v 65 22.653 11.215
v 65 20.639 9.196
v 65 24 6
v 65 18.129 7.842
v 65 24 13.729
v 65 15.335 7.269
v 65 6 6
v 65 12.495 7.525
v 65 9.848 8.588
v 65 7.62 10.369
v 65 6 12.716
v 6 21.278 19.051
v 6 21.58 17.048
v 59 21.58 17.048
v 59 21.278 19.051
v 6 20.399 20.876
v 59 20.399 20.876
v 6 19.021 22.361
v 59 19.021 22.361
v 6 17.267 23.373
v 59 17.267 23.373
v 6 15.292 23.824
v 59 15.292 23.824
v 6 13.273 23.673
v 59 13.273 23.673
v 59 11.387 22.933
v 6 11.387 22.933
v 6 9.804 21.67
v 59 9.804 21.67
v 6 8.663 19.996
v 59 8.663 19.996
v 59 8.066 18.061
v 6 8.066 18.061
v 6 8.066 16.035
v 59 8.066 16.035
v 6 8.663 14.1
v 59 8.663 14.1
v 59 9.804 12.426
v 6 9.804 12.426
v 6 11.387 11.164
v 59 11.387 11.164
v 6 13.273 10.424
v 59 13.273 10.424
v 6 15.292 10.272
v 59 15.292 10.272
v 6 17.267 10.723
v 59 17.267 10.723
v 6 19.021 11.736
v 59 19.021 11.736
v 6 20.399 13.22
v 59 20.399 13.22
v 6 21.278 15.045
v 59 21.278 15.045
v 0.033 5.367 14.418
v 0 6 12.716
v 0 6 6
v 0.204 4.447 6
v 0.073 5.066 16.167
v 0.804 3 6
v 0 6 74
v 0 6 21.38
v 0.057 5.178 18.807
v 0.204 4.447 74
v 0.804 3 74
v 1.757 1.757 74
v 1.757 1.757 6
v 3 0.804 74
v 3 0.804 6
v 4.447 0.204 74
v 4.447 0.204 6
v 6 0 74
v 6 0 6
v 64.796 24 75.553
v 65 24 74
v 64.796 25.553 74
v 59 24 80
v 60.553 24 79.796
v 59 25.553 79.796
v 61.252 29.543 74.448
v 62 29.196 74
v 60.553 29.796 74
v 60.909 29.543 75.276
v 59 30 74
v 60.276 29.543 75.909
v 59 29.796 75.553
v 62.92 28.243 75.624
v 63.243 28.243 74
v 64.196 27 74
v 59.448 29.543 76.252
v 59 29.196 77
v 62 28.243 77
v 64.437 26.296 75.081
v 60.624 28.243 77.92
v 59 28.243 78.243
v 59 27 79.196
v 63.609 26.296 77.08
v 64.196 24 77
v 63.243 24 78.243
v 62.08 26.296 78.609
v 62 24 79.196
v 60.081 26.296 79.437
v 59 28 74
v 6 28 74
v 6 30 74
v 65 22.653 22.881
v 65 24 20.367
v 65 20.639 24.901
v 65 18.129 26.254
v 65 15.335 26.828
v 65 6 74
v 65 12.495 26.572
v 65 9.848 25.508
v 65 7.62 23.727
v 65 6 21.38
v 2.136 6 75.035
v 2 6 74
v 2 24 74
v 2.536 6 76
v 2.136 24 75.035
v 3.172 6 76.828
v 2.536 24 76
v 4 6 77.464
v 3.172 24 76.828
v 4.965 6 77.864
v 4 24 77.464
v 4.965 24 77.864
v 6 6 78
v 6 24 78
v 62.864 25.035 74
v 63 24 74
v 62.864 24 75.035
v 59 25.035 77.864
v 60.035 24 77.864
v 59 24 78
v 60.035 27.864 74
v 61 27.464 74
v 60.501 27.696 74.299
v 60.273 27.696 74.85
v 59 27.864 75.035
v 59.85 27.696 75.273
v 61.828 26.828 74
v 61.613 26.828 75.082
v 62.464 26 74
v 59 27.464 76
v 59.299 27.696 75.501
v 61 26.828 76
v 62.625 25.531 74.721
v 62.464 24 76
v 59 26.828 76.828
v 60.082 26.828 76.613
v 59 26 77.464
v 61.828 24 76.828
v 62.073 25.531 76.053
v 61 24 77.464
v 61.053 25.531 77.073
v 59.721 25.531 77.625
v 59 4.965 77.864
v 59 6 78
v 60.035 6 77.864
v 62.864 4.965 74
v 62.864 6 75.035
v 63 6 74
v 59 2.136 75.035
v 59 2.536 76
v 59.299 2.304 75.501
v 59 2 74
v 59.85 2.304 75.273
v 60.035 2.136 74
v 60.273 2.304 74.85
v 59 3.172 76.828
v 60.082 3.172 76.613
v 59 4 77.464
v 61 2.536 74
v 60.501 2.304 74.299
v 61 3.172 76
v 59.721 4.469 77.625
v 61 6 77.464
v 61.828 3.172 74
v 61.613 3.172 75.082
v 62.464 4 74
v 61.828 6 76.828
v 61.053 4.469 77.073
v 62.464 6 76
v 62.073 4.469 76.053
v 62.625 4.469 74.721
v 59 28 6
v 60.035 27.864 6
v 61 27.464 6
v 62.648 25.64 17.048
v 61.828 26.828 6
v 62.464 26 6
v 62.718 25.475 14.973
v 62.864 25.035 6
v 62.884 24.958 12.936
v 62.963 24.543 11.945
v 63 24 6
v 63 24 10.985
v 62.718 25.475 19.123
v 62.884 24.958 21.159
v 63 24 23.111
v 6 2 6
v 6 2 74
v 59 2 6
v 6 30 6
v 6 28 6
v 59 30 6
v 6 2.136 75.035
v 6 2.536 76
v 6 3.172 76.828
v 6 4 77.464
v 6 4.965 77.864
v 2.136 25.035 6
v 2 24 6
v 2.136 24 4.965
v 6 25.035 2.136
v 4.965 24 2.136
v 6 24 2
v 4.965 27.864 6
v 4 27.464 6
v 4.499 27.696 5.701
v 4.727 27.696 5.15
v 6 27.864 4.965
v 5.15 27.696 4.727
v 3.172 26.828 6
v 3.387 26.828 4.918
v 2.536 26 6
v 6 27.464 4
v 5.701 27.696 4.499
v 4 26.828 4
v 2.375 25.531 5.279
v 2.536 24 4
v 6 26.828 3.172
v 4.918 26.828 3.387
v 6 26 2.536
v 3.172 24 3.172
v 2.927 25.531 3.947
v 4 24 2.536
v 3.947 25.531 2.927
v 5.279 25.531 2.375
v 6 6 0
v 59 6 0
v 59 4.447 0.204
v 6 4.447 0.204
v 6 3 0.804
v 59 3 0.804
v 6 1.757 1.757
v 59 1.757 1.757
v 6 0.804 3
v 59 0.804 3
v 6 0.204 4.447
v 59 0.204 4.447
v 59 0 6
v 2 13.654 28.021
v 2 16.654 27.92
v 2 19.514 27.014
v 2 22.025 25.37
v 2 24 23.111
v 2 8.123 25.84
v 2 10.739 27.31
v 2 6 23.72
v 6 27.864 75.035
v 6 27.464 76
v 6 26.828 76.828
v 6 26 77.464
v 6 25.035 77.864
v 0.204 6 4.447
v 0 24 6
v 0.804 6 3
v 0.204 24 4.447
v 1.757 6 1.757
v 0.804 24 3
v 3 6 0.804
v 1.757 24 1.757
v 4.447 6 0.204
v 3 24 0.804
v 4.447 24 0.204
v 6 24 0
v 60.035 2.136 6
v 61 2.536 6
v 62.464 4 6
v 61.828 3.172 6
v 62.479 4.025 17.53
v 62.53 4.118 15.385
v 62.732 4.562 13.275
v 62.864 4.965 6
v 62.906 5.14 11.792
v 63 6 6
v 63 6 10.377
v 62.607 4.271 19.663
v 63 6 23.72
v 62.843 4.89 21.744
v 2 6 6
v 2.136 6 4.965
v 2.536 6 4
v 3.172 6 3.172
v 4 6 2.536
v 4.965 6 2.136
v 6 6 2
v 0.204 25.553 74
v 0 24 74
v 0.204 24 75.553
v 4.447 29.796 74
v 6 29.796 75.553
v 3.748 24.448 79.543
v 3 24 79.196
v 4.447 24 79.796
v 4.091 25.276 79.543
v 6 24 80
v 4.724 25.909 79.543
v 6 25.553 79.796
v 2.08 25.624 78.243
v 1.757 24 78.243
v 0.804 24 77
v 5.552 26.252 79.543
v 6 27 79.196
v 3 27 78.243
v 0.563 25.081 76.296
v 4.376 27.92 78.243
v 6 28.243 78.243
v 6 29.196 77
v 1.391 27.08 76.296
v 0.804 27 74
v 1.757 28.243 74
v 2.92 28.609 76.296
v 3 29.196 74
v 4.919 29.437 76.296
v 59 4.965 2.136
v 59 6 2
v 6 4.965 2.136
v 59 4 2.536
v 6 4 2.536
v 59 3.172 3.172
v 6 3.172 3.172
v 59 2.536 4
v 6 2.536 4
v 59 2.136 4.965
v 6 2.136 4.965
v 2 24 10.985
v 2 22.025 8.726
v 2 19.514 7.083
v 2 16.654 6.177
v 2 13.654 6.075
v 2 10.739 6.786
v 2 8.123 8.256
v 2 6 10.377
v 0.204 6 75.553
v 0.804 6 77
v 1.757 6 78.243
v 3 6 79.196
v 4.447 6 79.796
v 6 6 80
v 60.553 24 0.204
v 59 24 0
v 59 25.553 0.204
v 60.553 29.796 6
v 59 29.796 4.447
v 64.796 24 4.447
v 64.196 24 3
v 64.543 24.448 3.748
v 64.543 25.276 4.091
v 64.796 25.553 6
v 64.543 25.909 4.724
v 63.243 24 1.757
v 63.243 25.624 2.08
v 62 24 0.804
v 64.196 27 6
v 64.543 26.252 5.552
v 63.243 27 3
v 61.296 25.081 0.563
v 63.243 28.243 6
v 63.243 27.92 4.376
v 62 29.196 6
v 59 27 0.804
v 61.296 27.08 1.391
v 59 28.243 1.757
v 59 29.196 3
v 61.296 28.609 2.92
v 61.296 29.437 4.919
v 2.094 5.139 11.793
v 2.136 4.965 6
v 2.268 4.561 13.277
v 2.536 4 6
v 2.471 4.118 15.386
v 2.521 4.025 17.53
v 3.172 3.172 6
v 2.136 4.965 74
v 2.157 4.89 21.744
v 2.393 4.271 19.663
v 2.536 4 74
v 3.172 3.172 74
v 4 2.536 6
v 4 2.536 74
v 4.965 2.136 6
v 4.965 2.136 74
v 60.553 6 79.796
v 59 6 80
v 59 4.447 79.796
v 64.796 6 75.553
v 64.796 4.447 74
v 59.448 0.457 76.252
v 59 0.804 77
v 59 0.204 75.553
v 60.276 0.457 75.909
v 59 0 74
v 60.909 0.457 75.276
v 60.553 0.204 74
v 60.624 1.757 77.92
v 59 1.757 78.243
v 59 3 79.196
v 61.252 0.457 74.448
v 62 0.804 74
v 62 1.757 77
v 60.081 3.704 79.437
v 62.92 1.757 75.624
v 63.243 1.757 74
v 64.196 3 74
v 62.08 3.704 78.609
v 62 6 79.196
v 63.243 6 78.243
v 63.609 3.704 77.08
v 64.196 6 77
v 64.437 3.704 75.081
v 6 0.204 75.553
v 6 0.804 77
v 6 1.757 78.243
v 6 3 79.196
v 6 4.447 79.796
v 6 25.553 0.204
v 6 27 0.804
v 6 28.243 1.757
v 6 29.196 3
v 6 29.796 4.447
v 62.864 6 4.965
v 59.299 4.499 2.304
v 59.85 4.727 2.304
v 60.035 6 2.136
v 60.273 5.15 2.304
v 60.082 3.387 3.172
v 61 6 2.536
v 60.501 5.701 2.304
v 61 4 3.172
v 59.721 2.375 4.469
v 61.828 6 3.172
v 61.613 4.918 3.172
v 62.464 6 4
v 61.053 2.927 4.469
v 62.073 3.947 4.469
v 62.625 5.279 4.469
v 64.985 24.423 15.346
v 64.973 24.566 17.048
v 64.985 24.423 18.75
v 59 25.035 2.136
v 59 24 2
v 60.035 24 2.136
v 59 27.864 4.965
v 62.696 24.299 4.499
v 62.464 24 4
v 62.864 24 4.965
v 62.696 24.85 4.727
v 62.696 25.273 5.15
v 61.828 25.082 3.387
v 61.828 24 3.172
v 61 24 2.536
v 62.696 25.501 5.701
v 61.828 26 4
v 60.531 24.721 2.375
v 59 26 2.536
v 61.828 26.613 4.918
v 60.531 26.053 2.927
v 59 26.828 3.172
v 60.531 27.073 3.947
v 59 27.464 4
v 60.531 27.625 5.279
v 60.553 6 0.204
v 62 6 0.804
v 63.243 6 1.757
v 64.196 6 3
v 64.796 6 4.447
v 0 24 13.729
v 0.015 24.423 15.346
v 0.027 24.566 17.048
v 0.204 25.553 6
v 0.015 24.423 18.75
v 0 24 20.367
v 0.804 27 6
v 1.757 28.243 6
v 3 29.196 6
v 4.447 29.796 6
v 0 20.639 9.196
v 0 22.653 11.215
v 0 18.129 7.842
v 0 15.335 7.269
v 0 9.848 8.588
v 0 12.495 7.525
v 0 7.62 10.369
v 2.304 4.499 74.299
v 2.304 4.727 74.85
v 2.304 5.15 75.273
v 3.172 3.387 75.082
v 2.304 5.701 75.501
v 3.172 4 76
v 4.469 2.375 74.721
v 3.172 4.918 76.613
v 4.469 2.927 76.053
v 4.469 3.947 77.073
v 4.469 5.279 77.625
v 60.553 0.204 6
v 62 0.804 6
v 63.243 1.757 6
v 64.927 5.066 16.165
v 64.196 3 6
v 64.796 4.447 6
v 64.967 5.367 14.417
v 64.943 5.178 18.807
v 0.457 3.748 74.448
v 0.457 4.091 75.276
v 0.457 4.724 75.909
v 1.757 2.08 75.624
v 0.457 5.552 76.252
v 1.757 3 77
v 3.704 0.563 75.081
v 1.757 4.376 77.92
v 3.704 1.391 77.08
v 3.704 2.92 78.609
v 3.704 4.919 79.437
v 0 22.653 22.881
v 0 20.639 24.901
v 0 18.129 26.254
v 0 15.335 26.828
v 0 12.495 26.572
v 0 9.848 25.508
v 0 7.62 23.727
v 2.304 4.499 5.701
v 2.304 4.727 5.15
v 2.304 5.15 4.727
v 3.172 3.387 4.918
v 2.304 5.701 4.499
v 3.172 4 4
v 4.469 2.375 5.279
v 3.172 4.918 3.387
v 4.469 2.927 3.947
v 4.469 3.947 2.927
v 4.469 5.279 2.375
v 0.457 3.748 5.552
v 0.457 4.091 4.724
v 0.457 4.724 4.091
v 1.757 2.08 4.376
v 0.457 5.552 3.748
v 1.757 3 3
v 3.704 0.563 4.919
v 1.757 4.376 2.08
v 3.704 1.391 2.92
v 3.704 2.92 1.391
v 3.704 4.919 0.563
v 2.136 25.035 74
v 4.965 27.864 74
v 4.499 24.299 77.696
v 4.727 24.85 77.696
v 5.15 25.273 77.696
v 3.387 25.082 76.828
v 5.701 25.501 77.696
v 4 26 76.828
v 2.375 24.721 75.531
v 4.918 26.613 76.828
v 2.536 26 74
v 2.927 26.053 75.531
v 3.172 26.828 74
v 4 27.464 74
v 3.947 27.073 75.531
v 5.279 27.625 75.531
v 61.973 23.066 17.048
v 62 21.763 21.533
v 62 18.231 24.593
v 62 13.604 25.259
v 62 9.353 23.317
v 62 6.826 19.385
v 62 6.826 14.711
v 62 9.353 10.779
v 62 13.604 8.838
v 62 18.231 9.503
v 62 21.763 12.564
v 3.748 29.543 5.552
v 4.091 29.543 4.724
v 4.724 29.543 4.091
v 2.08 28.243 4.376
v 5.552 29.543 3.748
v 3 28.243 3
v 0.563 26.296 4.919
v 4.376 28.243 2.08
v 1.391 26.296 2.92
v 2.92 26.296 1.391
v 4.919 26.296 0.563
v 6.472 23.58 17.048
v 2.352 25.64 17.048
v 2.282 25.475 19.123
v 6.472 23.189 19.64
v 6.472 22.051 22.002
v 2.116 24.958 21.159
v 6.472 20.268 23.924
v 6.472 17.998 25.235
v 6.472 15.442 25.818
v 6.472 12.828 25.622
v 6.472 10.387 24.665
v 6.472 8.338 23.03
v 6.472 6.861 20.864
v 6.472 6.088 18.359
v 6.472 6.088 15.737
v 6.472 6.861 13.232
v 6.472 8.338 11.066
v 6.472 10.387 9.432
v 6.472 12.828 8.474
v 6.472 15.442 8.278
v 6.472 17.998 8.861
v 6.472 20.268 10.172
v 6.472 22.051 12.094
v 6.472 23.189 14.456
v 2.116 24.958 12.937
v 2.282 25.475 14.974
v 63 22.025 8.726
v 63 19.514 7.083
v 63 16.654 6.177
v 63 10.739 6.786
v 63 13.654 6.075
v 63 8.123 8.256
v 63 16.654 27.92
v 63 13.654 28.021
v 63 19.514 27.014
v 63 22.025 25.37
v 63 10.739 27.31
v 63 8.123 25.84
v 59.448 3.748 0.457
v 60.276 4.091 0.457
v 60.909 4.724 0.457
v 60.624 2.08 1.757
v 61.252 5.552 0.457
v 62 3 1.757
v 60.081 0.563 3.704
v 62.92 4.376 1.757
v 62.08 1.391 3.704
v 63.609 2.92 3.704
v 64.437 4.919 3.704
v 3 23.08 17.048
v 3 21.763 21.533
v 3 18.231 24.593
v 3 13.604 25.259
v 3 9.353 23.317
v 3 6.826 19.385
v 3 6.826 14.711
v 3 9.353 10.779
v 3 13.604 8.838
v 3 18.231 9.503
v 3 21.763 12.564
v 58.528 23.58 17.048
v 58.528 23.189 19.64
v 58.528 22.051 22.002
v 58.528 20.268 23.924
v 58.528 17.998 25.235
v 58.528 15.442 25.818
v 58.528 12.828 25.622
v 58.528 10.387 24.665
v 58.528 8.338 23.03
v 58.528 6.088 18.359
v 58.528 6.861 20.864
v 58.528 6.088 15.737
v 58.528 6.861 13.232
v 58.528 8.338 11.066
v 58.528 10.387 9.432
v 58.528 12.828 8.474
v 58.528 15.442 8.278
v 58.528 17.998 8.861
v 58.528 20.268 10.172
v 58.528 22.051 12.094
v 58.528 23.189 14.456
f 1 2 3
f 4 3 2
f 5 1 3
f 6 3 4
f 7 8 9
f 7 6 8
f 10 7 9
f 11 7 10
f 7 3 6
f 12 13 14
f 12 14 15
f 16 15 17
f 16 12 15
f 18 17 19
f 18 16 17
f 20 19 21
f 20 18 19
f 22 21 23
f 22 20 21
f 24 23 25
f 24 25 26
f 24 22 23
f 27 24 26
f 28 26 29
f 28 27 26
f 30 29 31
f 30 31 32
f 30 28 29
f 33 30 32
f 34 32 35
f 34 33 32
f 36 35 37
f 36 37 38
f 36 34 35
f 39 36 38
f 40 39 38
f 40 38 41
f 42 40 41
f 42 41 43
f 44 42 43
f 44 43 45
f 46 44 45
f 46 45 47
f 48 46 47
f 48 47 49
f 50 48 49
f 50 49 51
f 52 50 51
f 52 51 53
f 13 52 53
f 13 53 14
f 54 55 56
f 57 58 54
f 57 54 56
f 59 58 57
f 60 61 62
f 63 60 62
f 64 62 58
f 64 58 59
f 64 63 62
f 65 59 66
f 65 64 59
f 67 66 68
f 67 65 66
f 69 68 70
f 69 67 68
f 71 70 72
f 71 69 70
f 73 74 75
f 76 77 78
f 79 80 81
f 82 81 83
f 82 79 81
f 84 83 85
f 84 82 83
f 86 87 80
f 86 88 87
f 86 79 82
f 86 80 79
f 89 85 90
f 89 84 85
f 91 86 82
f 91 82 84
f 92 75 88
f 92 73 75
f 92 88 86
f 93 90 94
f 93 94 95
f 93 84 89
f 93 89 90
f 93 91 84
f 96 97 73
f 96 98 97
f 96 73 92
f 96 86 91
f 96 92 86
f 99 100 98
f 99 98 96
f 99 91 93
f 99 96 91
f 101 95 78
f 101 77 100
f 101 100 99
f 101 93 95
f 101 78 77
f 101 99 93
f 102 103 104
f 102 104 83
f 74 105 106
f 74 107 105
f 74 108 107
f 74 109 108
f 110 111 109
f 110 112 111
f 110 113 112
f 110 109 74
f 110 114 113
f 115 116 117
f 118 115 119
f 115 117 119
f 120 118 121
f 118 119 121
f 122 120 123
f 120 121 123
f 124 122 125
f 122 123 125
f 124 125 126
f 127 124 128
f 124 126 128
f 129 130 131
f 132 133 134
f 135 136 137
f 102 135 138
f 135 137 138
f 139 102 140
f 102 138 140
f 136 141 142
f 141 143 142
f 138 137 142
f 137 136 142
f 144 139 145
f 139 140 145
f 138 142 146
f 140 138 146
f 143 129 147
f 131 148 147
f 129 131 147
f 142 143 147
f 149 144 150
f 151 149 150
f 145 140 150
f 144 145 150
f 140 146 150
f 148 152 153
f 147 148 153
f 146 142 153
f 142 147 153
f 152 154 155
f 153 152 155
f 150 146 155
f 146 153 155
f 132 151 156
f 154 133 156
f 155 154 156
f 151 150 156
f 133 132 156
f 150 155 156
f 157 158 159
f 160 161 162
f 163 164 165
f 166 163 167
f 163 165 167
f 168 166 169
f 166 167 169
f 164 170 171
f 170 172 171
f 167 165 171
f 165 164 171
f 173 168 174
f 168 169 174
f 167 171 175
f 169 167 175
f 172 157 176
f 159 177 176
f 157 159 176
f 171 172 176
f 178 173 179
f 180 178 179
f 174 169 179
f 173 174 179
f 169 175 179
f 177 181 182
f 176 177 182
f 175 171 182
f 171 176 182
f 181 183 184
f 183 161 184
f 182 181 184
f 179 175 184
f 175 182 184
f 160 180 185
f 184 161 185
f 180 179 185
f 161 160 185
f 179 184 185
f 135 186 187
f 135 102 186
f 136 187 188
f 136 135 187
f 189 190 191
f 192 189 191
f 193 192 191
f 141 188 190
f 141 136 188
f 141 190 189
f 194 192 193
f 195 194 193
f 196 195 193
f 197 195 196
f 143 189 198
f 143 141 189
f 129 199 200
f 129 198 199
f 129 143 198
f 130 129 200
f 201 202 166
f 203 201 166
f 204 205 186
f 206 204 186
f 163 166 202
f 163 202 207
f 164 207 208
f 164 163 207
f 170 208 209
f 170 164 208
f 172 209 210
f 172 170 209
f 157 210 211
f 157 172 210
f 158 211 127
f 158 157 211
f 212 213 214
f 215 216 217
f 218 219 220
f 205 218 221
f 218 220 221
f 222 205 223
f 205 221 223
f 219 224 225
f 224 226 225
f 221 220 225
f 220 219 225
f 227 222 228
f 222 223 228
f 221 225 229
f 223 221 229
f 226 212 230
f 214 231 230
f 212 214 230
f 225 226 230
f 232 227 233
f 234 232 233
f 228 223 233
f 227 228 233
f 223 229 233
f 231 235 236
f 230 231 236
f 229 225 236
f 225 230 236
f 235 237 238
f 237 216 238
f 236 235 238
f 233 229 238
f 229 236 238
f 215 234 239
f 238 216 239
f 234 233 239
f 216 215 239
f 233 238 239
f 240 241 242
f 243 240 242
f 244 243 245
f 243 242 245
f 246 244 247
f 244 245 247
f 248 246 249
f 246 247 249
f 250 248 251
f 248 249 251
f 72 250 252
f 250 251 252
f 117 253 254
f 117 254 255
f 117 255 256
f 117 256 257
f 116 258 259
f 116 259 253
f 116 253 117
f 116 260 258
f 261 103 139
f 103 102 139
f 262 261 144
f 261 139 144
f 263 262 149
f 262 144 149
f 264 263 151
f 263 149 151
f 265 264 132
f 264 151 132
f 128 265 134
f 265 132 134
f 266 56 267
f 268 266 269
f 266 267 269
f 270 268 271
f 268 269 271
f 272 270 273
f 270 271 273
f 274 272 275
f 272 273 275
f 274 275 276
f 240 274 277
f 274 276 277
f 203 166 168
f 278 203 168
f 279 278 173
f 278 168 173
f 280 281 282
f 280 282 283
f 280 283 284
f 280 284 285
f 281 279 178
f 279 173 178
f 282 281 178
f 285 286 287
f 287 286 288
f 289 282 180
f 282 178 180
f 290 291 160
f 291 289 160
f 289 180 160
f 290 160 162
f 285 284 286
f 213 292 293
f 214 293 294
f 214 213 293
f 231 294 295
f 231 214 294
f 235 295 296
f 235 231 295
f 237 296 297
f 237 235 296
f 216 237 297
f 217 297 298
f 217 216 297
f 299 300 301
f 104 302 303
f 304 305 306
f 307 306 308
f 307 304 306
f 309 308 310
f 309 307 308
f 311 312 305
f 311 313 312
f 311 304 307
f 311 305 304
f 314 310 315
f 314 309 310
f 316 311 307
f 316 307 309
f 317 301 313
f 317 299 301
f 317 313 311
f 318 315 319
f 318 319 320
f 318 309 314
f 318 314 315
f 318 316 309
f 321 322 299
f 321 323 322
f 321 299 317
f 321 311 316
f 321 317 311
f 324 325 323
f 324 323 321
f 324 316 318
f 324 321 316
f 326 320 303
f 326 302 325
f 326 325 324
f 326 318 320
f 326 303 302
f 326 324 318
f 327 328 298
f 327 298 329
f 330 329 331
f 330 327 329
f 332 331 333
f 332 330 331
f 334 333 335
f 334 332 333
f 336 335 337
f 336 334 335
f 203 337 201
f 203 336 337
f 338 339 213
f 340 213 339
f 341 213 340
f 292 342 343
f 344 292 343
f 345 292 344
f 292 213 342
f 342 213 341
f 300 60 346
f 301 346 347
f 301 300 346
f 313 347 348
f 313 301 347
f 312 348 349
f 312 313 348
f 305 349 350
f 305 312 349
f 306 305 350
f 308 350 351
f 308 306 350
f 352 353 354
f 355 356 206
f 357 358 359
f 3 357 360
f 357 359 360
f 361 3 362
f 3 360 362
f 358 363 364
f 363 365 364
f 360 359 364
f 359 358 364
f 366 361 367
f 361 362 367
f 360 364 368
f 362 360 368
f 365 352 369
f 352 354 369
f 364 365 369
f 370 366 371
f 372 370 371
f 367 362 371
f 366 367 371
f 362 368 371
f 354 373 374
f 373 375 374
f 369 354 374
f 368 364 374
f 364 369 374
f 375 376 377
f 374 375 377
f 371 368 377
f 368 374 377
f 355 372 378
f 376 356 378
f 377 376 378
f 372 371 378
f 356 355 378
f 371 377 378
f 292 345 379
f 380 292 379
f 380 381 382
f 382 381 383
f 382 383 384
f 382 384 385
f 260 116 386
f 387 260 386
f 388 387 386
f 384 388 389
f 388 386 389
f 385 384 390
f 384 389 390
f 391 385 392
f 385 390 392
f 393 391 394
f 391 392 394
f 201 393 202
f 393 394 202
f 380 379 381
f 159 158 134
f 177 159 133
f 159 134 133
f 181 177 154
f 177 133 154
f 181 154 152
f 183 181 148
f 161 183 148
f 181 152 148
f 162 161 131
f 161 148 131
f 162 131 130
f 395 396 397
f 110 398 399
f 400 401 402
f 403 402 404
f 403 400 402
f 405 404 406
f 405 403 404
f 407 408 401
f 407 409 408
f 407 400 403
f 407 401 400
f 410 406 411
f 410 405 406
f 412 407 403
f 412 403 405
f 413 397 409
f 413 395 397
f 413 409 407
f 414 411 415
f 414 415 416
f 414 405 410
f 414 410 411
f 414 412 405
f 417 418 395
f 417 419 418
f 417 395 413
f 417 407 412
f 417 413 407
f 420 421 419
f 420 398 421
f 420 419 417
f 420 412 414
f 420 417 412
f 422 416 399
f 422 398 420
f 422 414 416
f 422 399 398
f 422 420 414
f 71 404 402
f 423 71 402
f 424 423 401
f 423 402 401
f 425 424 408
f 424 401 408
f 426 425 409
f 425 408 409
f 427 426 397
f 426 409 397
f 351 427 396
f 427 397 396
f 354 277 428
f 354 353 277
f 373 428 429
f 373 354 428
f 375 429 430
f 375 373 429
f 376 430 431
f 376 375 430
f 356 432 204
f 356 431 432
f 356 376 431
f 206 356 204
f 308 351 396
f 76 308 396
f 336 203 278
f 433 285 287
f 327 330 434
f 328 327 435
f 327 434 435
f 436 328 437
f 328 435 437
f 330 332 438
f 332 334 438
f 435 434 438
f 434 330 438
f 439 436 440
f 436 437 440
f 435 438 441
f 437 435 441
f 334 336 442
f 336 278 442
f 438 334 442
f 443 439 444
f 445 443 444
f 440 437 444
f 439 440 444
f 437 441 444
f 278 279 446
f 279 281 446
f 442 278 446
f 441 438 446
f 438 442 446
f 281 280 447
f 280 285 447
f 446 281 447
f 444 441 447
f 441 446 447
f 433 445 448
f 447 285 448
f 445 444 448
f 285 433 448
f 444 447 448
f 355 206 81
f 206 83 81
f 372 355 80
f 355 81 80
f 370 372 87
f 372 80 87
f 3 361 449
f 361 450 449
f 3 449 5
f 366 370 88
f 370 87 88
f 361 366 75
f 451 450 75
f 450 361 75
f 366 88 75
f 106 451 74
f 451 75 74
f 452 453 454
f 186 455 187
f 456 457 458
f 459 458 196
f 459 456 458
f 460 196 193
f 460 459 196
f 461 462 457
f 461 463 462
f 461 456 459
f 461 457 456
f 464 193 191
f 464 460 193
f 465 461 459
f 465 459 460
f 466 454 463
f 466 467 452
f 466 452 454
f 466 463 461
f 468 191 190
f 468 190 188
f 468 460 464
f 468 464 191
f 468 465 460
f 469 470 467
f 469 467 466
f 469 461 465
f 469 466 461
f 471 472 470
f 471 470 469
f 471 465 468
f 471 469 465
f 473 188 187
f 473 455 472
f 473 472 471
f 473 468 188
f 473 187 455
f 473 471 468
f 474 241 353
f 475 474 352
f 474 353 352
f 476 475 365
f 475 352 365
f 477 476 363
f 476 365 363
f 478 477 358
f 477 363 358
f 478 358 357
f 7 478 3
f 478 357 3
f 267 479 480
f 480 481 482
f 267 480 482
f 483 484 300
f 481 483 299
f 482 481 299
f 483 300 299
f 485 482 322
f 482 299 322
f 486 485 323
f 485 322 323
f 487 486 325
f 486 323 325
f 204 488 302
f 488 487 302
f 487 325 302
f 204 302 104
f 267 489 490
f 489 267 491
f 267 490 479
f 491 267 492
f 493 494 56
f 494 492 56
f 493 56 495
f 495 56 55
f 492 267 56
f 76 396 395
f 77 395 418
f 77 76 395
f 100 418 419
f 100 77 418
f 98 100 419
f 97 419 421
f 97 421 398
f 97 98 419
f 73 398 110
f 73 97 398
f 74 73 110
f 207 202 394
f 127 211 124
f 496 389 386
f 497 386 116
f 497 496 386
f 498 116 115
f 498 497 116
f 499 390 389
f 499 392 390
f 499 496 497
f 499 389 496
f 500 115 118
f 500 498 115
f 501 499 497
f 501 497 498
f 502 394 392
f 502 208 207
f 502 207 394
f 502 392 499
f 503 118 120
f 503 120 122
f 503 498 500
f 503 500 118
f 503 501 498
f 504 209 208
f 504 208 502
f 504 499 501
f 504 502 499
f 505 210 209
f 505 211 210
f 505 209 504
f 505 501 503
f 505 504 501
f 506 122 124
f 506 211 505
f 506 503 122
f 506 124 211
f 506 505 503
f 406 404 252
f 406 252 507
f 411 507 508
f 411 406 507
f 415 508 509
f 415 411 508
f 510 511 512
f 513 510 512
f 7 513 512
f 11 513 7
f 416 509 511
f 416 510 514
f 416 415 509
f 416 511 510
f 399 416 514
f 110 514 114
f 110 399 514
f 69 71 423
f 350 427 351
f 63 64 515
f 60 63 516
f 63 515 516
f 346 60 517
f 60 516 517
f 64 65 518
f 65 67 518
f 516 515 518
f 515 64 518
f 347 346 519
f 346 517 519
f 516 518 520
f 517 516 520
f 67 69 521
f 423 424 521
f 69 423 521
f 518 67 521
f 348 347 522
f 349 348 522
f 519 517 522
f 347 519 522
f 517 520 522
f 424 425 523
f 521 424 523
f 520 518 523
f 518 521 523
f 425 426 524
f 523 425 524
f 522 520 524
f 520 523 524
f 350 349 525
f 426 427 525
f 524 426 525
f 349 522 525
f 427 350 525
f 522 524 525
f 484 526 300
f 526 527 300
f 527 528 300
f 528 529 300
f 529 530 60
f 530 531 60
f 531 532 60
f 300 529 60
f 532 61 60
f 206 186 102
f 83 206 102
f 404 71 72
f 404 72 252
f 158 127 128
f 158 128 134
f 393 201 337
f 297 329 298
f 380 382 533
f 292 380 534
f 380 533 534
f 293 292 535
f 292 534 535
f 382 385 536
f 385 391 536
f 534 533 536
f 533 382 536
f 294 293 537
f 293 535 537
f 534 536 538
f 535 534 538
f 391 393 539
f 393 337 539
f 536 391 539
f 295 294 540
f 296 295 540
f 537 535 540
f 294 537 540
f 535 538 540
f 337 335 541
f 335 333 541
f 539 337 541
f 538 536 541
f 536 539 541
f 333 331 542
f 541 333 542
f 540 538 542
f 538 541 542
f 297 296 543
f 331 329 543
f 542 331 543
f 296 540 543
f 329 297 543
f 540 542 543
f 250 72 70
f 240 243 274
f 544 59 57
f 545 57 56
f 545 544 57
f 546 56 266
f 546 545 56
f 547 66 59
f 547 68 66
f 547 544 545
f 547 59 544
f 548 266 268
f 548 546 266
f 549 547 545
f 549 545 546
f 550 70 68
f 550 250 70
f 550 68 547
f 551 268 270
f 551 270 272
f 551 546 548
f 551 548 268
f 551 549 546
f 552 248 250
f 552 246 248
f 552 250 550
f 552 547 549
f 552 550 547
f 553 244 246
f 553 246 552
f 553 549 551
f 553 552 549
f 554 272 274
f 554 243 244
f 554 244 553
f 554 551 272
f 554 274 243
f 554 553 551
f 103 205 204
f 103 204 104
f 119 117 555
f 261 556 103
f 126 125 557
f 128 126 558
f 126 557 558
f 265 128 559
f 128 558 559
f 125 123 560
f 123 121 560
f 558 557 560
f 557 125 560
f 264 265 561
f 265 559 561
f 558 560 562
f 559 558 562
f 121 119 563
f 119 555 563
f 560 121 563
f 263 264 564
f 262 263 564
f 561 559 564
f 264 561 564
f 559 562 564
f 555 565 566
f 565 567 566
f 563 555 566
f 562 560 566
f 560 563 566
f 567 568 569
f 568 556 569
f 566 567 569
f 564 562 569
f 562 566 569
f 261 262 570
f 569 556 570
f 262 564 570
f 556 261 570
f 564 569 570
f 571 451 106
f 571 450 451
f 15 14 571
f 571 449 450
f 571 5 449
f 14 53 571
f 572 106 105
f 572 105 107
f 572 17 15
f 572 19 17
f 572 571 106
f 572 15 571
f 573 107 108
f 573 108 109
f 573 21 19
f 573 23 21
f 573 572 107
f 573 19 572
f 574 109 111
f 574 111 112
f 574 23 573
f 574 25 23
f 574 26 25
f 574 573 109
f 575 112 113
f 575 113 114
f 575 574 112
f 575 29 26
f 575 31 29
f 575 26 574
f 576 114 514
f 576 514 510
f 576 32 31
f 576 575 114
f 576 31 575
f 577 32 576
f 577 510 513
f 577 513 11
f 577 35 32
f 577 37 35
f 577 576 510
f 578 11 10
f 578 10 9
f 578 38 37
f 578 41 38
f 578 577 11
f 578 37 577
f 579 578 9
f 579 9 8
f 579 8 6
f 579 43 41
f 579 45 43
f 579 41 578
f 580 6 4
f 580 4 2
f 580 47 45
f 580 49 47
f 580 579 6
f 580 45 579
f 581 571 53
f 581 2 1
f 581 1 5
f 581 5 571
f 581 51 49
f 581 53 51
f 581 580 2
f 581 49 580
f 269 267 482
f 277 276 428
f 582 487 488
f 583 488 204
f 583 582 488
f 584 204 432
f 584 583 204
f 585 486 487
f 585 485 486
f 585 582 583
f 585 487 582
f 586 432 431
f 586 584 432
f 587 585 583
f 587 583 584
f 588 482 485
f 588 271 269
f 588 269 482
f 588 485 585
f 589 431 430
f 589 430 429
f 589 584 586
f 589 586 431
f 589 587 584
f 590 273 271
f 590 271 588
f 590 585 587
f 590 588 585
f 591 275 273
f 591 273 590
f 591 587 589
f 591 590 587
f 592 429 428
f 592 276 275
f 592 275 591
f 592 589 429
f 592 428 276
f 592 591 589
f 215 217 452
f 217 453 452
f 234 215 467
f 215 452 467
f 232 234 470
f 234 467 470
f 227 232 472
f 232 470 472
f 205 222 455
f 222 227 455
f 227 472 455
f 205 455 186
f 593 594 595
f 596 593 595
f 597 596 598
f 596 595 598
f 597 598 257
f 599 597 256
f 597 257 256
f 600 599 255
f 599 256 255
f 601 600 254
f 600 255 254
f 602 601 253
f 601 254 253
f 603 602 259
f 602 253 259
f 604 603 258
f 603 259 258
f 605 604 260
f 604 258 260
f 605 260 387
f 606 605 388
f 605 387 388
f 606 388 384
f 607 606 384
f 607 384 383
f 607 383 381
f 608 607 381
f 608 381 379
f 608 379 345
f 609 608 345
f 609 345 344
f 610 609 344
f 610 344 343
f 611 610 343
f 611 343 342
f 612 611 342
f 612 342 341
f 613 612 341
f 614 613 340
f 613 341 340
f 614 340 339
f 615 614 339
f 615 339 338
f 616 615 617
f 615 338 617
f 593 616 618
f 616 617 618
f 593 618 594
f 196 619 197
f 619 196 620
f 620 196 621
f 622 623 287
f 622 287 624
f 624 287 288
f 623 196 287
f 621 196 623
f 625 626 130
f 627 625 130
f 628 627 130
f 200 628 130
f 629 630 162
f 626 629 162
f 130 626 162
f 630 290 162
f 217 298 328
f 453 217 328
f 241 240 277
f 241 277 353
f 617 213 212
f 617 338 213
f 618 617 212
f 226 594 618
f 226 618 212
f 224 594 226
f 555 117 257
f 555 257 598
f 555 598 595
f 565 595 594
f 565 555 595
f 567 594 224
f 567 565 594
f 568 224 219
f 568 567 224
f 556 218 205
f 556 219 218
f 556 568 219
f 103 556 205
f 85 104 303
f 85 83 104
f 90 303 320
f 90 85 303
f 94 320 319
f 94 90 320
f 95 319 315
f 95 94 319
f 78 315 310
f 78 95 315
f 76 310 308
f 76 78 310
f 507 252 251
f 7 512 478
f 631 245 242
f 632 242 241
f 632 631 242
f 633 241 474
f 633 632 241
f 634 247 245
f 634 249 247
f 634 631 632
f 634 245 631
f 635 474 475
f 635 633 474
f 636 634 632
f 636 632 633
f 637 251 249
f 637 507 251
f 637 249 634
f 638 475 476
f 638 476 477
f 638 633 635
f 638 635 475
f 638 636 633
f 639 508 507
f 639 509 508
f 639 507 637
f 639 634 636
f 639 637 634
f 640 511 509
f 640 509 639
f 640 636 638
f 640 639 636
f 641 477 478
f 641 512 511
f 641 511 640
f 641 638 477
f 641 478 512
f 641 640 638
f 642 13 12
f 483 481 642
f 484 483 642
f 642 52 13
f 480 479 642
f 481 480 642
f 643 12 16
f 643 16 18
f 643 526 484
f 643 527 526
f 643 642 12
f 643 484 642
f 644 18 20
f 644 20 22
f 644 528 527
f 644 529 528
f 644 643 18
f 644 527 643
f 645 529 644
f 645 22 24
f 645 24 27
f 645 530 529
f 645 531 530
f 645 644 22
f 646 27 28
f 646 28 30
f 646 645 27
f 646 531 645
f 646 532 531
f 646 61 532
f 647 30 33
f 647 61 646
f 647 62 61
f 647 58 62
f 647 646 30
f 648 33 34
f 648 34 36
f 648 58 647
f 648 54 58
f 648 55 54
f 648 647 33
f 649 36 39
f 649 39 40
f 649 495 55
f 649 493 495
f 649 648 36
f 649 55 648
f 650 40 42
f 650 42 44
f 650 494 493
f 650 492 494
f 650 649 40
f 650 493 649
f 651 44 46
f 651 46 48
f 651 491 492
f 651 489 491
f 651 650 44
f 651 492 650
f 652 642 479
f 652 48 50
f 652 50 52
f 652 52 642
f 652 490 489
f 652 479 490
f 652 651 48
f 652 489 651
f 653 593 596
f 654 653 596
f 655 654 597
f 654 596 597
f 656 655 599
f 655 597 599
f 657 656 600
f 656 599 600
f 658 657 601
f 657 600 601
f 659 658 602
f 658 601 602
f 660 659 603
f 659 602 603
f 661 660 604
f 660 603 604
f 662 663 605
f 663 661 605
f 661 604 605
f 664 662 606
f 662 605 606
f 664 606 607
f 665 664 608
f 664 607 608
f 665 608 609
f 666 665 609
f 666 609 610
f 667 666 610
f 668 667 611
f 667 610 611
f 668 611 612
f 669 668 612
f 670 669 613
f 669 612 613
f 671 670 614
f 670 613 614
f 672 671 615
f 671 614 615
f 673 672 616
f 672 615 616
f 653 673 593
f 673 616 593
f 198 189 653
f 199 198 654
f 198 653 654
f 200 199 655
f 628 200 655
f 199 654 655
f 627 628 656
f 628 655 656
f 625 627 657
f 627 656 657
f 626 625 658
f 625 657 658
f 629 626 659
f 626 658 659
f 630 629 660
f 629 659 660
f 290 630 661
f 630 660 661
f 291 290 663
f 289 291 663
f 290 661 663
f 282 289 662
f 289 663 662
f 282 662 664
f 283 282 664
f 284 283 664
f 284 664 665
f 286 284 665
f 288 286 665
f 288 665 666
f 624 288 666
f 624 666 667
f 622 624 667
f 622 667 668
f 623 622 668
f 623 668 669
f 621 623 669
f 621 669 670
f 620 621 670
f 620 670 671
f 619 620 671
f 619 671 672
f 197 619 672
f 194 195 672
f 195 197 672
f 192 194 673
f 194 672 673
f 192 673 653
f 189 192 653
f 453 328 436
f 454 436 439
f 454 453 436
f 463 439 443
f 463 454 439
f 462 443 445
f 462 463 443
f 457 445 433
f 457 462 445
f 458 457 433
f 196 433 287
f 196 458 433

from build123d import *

# Parameters (mm, degrees)
F0_W     = 65
F0_H     = 80
F1_DEPTH = 30
F2_R     = 6.7948556495
F3_DEPTH = 65
F4_R     = 6
F6_T     = -2


# Not quite as in the source:
# - a fillet or chamfer that OpenCascade refuses, or shapes differently, is made with other operations: its cross-section is extruded or revolved along the edge and cut away or added
# - a shell that OpenCascade refuses in one call is made with other operations: the cavity is built on its own and cut out


with BuildPart() as f1:
    # F0 (on Front) → F1 (new body)
    with BuildSketch(Plane.XZ):
        with Locations((32.5, 40)):
            Rectangle(F0_W, F0_H)
    extrude(amount=-F1_DEPTH)

    # F2 (on Right) → F3 (cut, through all)
    with BuildSketch(Plane.YZ):
        with Locations((14.7847002372, 17.048144713)):
            Circle(F2_R)
    extrude(amount=F3_DEPTH, mode=Mode.SUBTRACT)

    # F4
    f4_edges = [f1.edges().sort_by_distance(p)[0] for p in [
        (65, 15, 80),
        (32.5, 0, 80),
        (65, 0, 40),
        (32.5, 0, 0),
        (0, 0, 40),
        (0, 15, 0),
        (0, 30, 40),
        (32.5, 30, 0),
        (65, 15, 0),
        (0, 15, 80),
        (65, 30, 40),
        (32.5, 30, 80),
    ]]
    fillet(f4_edges, radius=F4_R)

    # F5: chamfer of 3 x 6 on 3 edges, made by hand

    # F5_s1 → F5_t2 (revolve, cut)
    with BuildSketch(Plane.XY.offset(17.048144713)):
        Polygon((65, 24.5795558867), (59, 21.5795558867), (65, 21.5795558867), align=None)
    revolve(axis=Axis((65, 14.7847002372, 17.048144713), (1, 0, 0)), mode=Mode.SUBTRACT)

    # F5_s3 → F5_t4 (revolve, cut)
    with BuildSketch(Plane.XY.offset(17.048144713)):
        Polygon((6, 21.5795558867), (0, 24.5795558867), (0, 21.5795558867), align=None)
    revolve(axis=Axis((0, 14.7847002372, 17.048144713), (1, 0, 0)), mode=Mode.SUBTRACT)

    # F6: a shell. OpenCascade refuses it in one call, so the cavity is built on its own and cut out:
    # the body offset inwards by the wall thickness, plus a prism from it out through each open face.
    f6_core = offset(f1.part, amount=F6_T, mode=Mode.PRIVATE)
    f6_exits = [f6_core.faces().sort_by_distance(p)[0] for p in [
        (32.5, 28, 40),
    ]]
    add(f6_core, mode=Mode.SUBTRACT)
    extrude(f6_exits, amount=-F6_T, mode=Mode.SUBTRACT)


solid = f1.part
